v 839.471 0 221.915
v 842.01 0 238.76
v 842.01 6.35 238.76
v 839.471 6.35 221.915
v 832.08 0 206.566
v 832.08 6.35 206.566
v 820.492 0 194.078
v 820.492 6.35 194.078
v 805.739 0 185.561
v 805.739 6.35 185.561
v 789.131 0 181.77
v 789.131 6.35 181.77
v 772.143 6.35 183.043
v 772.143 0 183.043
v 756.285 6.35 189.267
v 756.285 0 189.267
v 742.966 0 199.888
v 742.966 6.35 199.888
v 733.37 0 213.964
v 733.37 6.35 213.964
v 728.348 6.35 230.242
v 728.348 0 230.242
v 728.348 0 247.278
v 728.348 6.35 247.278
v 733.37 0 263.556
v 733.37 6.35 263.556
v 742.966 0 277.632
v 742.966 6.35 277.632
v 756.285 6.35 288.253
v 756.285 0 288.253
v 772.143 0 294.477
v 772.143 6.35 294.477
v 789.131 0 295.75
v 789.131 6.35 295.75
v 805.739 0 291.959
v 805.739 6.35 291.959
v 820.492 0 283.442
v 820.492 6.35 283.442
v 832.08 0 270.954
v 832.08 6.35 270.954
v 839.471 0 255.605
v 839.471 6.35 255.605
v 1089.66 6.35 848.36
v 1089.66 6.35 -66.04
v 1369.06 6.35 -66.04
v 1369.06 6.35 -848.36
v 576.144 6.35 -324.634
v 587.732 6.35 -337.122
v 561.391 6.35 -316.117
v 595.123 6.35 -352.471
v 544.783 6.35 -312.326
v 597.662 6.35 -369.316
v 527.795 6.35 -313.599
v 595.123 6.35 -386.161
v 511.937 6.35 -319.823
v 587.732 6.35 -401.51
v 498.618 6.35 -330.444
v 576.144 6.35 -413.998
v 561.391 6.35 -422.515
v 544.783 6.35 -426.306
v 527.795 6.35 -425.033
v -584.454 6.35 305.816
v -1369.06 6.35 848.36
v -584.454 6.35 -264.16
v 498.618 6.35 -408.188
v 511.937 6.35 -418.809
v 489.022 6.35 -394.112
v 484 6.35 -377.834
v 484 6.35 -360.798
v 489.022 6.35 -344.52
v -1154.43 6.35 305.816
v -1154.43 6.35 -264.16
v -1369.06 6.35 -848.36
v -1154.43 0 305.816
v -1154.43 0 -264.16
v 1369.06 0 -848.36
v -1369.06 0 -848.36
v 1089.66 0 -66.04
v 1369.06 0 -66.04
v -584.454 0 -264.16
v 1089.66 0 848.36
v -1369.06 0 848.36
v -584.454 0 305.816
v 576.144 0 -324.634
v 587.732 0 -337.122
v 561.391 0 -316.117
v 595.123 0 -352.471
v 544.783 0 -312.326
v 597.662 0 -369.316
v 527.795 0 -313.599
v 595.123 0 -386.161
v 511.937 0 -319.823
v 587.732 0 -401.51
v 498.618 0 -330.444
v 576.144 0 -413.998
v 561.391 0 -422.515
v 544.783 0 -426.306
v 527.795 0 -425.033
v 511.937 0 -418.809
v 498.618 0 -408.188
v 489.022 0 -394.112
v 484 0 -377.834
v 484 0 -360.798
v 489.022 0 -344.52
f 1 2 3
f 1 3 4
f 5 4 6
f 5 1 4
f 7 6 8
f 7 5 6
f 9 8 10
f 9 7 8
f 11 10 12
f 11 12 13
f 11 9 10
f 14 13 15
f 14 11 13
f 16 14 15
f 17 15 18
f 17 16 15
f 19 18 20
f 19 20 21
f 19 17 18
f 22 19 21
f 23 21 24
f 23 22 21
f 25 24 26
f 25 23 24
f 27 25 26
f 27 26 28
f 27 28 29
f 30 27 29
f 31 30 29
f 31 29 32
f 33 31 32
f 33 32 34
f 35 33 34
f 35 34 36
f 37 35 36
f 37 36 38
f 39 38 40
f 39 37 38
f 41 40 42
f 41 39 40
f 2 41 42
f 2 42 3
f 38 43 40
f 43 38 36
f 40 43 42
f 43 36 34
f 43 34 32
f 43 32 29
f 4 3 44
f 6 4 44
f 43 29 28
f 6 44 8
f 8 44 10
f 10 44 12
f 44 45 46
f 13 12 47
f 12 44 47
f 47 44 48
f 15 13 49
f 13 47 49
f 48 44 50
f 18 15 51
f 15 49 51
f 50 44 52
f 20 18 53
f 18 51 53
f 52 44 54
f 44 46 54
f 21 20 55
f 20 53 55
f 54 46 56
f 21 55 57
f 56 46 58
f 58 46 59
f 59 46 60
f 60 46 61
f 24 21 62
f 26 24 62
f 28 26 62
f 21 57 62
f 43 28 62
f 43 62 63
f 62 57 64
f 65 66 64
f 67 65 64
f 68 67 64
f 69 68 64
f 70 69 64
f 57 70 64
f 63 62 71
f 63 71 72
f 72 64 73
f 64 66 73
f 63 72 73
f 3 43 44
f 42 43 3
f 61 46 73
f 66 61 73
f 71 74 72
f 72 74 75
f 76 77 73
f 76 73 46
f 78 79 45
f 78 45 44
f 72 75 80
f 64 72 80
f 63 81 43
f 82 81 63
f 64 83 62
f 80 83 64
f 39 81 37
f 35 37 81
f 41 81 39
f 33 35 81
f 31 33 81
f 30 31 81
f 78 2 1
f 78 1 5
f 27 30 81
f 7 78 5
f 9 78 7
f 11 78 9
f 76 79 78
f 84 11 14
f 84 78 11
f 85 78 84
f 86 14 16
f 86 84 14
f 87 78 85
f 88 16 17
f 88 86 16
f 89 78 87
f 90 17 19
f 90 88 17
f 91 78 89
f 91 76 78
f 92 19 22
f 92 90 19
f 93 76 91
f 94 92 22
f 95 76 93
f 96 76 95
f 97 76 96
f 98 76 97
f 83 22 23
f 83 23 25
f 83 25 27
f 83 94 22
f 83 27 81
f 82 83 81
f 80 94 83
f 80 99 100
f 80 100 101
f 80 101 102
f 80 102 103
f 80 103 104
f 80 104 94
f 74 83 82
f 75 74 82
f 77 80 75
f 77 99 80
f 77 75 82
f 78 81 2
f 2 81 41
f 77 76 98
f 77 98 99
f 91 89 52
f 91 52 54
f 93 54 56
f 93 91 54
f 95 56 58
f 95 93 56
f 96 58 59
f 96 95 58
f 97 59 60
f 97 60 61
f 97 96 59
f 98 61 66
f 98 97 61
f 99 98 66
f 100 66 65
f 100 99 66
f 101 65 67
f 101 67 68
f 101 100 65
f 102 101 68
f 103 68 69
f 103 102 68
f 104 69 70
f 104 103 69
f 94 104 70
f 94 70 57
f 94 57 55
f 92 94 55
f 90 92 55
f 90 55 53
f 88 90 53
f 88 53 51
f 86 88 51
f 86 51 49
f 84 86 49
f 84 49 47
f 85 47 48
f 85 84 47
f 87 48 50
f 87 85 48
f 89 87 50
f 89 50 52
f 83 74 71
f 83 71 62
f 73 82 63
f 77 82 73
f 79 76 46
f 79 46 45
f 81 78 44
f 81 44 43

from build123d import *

# Parameters (mm, degrees)
SKETCH1_R           = 57.15
SKETCH1_W           = 569.976
SKETCH1_H           = 569.976
BOSS_EXTRUDE1_DEPTH = 6.35


with BuildPart() as part:
    # Sketch1 → Boss-Extrude1 (new body)
    with BuildSketch(Plane(origin=(0, 0, 0), x_dir=(1, 0, 0), z_dir=(0, 1, 0))):
        Polygon((1369.06, 66.04), (1089.66, 66.04), (1089.66, -848.36), (-1369.06, -848.36), (-1369.06, 848.36), (1369.06, 848.36), align=None)
        with Locations((540.512, 369.316)):
            Circle(SKETCH1_R, mode=Mode.SUBTRACT)
        with Locations((784.86, -238.76)):
            Circle(SKETCH1_R, mode=Mode.SUBTRACT)
        with Locations((-869.442, -20.828)):
            Rectangle(SKETCH1_W, SKETCH1_H, mode=Mode.SUBTRACT)
    extrude(amount=BOSS_EXTRUDE1_DEPTH)


solid = part.part
